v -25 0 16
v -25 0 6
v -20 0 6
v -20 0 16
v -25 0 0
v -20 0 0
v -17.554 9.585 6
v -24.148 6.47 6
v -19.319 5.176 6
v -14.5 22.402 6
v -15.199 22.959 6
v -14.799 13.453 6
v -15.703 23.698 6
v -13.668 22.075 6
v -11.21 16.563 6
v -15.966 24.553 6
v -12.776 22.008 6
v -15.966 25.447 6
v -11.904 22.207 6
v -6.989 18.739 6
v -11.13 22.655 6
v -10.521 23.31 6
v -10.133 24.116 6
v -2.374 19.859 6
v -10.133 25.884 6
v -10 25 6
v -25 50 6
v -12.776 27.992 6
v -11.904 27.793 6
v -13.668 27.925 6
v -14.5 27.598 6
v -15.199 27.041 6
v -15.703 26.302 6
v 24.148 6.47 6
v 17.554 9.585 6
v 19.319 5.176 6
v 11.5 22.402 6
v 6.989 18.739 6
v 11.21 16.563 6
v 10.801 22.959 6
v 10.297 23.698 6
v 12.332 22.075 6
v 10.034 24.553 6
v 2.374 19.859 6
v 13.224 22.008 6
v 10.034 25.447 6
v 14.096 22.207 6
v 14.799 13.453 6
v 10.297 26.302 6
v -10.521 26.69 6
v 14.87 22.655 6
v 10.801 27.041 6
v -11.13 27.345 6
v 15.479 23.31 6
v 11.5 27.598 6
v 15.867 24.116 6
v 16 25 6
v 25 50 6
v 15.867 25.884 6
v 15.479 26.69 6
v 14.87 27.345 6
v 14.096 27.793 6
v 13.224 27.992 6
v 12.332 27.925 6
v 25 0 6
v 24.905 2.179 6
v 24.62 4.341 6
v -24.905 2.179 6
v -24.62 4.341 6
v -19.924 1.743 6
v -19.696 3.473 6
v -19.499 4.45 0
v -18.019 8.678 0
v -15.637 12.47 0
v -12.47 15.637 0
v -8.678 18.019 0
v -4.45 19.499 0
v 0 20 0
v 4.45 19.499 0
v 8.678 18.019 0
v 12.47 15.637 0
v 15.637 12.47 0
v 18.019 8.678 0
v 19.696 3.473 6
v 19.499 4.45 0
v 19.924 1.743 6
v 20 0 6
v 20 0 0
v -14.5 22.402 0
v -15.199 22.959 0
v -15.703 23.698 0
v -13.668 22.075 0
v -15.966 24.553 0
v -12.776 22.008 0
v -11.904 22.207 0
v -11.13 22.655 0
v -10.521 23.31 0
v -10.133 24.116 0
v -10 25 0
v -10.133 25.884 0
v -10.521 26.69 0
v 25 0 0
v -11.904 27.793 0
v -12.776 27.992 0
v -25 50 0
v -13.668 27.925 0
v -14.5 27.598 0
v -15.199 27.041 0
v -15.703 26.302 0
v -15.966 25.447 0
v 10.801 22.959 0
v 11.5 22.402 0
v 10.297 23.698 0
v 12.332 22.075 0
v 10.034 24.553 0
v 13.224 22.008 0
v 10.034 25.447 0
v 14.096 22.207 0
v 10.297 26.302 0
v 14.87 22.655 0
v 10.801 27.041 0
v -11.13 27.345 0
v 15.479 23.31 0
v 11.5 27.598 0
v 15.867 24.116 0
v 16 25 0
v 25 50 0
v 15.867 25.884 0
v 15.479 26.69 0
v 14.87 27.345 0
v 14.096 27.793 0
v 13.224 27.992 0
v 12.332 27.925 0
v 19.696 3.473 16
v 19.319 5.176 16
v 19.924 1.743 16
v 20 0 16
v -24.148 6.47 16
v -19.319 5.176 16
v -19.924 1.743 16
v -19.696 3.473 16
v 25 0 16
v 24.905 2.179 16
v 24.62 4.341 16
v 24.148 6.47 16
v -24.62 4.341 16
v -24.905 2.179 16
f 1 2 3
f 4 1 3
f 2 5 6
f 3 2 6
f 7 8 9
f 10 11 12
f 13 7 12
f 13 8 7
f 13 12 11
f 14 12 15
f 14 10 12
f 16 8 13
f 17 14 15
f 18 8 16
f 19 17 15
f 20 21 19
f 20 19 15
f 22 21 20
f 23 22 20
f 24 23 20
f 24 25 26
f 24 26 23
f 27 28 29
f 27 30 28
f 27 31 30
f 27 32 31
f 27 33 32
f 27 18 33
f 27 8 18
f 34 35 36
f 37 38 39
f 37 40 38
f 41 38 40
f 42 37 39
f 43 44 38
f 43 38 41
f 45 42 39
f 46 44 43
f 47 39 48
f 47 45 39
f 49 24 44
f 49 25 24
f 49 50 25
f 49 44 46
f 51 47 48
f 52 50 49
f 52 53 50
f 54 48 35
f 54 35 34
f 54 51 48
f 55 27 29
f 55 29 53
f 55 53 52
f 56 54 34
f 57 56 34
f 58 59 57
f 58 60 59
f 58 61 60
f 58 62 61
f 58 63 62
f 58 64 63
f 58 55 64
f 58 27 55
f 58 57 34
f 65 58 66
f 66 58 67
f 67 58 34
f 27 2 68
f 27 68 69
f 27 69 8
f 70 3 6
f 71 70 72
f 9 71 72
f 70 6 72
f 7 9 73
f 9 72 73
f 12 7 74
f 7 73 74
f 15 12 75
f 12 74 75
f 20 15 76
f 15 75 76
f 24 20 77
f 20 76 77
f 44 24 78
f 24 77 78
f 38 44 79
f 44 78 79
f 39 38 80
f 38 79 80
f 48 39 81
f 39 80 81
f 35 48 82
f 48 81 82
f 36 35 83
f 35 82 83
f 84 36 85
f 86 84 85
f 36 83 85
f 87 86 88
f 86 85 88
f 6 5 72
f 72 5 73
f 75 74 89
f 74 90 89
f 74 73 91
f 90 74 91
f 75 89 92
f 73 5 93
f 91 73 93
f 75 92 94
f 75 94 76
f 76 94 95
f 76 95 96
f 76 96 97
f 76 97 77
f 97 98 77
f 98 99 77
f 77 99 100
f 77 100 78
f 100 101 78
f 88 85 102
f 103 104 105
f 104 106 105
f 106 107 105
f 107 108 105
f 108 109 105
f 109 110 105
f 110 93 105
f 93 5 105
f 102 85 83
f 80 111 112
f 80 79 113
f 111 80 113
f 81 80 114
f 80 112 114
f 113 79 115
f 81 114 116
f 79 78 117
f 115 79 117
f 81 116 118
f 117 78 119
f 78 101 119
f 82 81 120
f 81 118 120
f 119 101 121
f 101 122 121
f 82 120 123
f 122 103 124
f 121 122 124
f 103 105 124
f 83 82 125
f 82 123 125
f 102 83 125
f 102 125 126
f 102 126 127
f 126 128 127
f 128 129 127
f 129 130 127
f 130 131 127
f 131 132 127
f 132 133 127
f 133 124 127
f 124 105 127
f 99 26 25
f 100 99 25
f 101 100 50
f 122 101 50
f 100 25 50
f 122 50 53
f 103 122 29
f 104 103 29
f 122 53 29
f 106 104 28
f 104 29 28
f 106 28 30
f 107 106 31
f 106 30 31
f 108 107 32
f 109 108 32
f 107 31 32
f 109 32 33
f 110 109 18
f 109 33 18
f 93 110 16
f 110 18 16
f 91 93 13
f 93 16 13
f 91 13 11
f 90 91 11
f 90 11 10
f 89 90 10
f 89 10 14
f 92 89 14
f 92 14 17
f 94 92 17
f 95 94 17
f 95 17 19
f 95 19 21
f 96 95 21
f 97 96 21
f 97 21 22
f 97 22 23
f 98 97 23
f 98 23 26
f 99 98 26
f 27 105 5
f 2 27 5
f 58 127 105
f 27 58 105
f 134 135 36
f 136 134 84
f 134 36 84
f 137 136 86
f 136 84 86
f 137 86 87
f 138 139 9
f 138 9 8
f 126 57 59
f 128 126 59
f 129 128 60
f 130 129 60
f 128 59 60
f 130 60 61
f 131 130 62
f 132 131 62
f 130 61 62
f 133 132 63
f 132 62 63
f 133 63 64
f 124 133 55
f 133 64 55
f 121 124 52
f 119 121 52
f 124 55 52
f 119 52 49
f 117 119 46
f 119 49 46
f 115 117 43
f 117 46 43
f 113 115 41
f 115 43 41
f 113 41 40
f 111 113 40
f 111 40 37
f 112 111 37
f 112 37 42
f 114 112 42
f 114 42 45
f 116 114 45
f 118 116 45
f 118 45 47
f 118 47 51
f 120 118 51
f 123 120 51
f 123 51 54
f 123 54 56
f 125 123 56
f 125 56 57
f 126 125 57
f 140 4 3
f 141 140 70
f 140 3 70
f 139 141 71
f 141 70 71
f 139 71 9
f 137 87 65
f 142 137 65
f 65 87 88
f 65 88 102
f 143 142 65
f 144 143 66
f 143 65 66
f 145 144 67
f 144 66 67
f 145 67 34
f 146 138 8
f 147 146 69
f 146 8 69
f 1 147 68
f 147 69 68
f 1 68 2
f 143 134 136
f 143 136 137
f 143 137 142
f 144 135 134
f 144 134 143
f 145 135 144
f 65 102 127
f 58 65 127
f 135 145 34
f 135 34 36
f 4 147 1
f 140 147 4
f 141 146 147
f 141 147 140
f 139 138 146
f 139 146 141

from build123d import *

# Parameters (mm, degrees)
BOSS_EXTRUDE1_DEPTH = 6
BOSS_EXTRUDE2_DEPTH = 10
BOSS_EXTRUDE3_DEPTH = 6
SKETCH4_R           = 3
CUT_EXTRUDE1_DEPTH  = 57.789083458


with BuildPart() as part:
    # Sketch1 → Boss-Extrude1 (new body)
    with BuildSketch(Plane.XY):
        with BuildLine():
            Line((20, 0), (25, 0))
            ThreePointArc((25, 0), (0, 25), (-25, 0))
            Line((-25, 0), (-20, 0))
            ThreePointArc((-20, 0), (0, 20), (20, 0))
        make_face()
    extrude(amount=BOSS_EXTRUDE1_DEPTH)

    # Sketch2 → Boss-Extrude2 (add)
    with BuildSketch(Plane.XY.offset(6)):
        with BuildLine():
            ThreePointArc((-20, 0), (-19.828897227, 2.610523844), (-19.318516526, 5.176380902))
            Line((-19.318516526, 5.176380902), (-24.148145657, 6.470476128))
            ThreePointArc((-24.148145657, 6.470476128), (-24.786121534, 3.263154806), (-25, 0))
            Line((-25, 0), (-20, 0))
        make_face()
        with BuildLine():
            Line((24.148145657, 6.470476128), (19.318516526, 5.176380902))
            ThreePointArc((19.318516526, 5.176380902), (19.828897227, 2.610523844), (20, 0))
            Line((20, 0), (25, 0))
            ThreePointArc((25, 0), (24.786121534, 3.263154806), (24.148145657, 6.470476128))
        make_face()
    extrude(amount=BOSS_EXTRUDE2_DEPTH)

    # Sketch3 → Boss-Extrude3 (add)
    with BuildSketch(Plane(origin=(0, 0, 0), x_dir=(-1, 0, 0), z_dir=(0, 0, -1))):
        with BuildLine():
            Line((-25, 0), (-25, 50))
            Line((-25, 50), (25, 50))
            Line((25, 50), (25, 0))
            ThreePointArc((25, 0), (0, 25), (-25, 0))
        make_face()
    extrude(amount=-BOSS_EXTRUDE3_DEPTH)

    # Sketch4 → Cut-Extrude1 (cut, through all)
    with BuildSketch(Plane.XY.offset(6)):
        with Locations((13, 25)):
            Circle(SKETCH4_R)
        with Locations((-13, 25)):
            Circle(SKETCH4_R)
    extrude(amount=-CUT_EXTRUDE1_DEPTH, mode=Mode.SUBTRACT)


solid = part.part
